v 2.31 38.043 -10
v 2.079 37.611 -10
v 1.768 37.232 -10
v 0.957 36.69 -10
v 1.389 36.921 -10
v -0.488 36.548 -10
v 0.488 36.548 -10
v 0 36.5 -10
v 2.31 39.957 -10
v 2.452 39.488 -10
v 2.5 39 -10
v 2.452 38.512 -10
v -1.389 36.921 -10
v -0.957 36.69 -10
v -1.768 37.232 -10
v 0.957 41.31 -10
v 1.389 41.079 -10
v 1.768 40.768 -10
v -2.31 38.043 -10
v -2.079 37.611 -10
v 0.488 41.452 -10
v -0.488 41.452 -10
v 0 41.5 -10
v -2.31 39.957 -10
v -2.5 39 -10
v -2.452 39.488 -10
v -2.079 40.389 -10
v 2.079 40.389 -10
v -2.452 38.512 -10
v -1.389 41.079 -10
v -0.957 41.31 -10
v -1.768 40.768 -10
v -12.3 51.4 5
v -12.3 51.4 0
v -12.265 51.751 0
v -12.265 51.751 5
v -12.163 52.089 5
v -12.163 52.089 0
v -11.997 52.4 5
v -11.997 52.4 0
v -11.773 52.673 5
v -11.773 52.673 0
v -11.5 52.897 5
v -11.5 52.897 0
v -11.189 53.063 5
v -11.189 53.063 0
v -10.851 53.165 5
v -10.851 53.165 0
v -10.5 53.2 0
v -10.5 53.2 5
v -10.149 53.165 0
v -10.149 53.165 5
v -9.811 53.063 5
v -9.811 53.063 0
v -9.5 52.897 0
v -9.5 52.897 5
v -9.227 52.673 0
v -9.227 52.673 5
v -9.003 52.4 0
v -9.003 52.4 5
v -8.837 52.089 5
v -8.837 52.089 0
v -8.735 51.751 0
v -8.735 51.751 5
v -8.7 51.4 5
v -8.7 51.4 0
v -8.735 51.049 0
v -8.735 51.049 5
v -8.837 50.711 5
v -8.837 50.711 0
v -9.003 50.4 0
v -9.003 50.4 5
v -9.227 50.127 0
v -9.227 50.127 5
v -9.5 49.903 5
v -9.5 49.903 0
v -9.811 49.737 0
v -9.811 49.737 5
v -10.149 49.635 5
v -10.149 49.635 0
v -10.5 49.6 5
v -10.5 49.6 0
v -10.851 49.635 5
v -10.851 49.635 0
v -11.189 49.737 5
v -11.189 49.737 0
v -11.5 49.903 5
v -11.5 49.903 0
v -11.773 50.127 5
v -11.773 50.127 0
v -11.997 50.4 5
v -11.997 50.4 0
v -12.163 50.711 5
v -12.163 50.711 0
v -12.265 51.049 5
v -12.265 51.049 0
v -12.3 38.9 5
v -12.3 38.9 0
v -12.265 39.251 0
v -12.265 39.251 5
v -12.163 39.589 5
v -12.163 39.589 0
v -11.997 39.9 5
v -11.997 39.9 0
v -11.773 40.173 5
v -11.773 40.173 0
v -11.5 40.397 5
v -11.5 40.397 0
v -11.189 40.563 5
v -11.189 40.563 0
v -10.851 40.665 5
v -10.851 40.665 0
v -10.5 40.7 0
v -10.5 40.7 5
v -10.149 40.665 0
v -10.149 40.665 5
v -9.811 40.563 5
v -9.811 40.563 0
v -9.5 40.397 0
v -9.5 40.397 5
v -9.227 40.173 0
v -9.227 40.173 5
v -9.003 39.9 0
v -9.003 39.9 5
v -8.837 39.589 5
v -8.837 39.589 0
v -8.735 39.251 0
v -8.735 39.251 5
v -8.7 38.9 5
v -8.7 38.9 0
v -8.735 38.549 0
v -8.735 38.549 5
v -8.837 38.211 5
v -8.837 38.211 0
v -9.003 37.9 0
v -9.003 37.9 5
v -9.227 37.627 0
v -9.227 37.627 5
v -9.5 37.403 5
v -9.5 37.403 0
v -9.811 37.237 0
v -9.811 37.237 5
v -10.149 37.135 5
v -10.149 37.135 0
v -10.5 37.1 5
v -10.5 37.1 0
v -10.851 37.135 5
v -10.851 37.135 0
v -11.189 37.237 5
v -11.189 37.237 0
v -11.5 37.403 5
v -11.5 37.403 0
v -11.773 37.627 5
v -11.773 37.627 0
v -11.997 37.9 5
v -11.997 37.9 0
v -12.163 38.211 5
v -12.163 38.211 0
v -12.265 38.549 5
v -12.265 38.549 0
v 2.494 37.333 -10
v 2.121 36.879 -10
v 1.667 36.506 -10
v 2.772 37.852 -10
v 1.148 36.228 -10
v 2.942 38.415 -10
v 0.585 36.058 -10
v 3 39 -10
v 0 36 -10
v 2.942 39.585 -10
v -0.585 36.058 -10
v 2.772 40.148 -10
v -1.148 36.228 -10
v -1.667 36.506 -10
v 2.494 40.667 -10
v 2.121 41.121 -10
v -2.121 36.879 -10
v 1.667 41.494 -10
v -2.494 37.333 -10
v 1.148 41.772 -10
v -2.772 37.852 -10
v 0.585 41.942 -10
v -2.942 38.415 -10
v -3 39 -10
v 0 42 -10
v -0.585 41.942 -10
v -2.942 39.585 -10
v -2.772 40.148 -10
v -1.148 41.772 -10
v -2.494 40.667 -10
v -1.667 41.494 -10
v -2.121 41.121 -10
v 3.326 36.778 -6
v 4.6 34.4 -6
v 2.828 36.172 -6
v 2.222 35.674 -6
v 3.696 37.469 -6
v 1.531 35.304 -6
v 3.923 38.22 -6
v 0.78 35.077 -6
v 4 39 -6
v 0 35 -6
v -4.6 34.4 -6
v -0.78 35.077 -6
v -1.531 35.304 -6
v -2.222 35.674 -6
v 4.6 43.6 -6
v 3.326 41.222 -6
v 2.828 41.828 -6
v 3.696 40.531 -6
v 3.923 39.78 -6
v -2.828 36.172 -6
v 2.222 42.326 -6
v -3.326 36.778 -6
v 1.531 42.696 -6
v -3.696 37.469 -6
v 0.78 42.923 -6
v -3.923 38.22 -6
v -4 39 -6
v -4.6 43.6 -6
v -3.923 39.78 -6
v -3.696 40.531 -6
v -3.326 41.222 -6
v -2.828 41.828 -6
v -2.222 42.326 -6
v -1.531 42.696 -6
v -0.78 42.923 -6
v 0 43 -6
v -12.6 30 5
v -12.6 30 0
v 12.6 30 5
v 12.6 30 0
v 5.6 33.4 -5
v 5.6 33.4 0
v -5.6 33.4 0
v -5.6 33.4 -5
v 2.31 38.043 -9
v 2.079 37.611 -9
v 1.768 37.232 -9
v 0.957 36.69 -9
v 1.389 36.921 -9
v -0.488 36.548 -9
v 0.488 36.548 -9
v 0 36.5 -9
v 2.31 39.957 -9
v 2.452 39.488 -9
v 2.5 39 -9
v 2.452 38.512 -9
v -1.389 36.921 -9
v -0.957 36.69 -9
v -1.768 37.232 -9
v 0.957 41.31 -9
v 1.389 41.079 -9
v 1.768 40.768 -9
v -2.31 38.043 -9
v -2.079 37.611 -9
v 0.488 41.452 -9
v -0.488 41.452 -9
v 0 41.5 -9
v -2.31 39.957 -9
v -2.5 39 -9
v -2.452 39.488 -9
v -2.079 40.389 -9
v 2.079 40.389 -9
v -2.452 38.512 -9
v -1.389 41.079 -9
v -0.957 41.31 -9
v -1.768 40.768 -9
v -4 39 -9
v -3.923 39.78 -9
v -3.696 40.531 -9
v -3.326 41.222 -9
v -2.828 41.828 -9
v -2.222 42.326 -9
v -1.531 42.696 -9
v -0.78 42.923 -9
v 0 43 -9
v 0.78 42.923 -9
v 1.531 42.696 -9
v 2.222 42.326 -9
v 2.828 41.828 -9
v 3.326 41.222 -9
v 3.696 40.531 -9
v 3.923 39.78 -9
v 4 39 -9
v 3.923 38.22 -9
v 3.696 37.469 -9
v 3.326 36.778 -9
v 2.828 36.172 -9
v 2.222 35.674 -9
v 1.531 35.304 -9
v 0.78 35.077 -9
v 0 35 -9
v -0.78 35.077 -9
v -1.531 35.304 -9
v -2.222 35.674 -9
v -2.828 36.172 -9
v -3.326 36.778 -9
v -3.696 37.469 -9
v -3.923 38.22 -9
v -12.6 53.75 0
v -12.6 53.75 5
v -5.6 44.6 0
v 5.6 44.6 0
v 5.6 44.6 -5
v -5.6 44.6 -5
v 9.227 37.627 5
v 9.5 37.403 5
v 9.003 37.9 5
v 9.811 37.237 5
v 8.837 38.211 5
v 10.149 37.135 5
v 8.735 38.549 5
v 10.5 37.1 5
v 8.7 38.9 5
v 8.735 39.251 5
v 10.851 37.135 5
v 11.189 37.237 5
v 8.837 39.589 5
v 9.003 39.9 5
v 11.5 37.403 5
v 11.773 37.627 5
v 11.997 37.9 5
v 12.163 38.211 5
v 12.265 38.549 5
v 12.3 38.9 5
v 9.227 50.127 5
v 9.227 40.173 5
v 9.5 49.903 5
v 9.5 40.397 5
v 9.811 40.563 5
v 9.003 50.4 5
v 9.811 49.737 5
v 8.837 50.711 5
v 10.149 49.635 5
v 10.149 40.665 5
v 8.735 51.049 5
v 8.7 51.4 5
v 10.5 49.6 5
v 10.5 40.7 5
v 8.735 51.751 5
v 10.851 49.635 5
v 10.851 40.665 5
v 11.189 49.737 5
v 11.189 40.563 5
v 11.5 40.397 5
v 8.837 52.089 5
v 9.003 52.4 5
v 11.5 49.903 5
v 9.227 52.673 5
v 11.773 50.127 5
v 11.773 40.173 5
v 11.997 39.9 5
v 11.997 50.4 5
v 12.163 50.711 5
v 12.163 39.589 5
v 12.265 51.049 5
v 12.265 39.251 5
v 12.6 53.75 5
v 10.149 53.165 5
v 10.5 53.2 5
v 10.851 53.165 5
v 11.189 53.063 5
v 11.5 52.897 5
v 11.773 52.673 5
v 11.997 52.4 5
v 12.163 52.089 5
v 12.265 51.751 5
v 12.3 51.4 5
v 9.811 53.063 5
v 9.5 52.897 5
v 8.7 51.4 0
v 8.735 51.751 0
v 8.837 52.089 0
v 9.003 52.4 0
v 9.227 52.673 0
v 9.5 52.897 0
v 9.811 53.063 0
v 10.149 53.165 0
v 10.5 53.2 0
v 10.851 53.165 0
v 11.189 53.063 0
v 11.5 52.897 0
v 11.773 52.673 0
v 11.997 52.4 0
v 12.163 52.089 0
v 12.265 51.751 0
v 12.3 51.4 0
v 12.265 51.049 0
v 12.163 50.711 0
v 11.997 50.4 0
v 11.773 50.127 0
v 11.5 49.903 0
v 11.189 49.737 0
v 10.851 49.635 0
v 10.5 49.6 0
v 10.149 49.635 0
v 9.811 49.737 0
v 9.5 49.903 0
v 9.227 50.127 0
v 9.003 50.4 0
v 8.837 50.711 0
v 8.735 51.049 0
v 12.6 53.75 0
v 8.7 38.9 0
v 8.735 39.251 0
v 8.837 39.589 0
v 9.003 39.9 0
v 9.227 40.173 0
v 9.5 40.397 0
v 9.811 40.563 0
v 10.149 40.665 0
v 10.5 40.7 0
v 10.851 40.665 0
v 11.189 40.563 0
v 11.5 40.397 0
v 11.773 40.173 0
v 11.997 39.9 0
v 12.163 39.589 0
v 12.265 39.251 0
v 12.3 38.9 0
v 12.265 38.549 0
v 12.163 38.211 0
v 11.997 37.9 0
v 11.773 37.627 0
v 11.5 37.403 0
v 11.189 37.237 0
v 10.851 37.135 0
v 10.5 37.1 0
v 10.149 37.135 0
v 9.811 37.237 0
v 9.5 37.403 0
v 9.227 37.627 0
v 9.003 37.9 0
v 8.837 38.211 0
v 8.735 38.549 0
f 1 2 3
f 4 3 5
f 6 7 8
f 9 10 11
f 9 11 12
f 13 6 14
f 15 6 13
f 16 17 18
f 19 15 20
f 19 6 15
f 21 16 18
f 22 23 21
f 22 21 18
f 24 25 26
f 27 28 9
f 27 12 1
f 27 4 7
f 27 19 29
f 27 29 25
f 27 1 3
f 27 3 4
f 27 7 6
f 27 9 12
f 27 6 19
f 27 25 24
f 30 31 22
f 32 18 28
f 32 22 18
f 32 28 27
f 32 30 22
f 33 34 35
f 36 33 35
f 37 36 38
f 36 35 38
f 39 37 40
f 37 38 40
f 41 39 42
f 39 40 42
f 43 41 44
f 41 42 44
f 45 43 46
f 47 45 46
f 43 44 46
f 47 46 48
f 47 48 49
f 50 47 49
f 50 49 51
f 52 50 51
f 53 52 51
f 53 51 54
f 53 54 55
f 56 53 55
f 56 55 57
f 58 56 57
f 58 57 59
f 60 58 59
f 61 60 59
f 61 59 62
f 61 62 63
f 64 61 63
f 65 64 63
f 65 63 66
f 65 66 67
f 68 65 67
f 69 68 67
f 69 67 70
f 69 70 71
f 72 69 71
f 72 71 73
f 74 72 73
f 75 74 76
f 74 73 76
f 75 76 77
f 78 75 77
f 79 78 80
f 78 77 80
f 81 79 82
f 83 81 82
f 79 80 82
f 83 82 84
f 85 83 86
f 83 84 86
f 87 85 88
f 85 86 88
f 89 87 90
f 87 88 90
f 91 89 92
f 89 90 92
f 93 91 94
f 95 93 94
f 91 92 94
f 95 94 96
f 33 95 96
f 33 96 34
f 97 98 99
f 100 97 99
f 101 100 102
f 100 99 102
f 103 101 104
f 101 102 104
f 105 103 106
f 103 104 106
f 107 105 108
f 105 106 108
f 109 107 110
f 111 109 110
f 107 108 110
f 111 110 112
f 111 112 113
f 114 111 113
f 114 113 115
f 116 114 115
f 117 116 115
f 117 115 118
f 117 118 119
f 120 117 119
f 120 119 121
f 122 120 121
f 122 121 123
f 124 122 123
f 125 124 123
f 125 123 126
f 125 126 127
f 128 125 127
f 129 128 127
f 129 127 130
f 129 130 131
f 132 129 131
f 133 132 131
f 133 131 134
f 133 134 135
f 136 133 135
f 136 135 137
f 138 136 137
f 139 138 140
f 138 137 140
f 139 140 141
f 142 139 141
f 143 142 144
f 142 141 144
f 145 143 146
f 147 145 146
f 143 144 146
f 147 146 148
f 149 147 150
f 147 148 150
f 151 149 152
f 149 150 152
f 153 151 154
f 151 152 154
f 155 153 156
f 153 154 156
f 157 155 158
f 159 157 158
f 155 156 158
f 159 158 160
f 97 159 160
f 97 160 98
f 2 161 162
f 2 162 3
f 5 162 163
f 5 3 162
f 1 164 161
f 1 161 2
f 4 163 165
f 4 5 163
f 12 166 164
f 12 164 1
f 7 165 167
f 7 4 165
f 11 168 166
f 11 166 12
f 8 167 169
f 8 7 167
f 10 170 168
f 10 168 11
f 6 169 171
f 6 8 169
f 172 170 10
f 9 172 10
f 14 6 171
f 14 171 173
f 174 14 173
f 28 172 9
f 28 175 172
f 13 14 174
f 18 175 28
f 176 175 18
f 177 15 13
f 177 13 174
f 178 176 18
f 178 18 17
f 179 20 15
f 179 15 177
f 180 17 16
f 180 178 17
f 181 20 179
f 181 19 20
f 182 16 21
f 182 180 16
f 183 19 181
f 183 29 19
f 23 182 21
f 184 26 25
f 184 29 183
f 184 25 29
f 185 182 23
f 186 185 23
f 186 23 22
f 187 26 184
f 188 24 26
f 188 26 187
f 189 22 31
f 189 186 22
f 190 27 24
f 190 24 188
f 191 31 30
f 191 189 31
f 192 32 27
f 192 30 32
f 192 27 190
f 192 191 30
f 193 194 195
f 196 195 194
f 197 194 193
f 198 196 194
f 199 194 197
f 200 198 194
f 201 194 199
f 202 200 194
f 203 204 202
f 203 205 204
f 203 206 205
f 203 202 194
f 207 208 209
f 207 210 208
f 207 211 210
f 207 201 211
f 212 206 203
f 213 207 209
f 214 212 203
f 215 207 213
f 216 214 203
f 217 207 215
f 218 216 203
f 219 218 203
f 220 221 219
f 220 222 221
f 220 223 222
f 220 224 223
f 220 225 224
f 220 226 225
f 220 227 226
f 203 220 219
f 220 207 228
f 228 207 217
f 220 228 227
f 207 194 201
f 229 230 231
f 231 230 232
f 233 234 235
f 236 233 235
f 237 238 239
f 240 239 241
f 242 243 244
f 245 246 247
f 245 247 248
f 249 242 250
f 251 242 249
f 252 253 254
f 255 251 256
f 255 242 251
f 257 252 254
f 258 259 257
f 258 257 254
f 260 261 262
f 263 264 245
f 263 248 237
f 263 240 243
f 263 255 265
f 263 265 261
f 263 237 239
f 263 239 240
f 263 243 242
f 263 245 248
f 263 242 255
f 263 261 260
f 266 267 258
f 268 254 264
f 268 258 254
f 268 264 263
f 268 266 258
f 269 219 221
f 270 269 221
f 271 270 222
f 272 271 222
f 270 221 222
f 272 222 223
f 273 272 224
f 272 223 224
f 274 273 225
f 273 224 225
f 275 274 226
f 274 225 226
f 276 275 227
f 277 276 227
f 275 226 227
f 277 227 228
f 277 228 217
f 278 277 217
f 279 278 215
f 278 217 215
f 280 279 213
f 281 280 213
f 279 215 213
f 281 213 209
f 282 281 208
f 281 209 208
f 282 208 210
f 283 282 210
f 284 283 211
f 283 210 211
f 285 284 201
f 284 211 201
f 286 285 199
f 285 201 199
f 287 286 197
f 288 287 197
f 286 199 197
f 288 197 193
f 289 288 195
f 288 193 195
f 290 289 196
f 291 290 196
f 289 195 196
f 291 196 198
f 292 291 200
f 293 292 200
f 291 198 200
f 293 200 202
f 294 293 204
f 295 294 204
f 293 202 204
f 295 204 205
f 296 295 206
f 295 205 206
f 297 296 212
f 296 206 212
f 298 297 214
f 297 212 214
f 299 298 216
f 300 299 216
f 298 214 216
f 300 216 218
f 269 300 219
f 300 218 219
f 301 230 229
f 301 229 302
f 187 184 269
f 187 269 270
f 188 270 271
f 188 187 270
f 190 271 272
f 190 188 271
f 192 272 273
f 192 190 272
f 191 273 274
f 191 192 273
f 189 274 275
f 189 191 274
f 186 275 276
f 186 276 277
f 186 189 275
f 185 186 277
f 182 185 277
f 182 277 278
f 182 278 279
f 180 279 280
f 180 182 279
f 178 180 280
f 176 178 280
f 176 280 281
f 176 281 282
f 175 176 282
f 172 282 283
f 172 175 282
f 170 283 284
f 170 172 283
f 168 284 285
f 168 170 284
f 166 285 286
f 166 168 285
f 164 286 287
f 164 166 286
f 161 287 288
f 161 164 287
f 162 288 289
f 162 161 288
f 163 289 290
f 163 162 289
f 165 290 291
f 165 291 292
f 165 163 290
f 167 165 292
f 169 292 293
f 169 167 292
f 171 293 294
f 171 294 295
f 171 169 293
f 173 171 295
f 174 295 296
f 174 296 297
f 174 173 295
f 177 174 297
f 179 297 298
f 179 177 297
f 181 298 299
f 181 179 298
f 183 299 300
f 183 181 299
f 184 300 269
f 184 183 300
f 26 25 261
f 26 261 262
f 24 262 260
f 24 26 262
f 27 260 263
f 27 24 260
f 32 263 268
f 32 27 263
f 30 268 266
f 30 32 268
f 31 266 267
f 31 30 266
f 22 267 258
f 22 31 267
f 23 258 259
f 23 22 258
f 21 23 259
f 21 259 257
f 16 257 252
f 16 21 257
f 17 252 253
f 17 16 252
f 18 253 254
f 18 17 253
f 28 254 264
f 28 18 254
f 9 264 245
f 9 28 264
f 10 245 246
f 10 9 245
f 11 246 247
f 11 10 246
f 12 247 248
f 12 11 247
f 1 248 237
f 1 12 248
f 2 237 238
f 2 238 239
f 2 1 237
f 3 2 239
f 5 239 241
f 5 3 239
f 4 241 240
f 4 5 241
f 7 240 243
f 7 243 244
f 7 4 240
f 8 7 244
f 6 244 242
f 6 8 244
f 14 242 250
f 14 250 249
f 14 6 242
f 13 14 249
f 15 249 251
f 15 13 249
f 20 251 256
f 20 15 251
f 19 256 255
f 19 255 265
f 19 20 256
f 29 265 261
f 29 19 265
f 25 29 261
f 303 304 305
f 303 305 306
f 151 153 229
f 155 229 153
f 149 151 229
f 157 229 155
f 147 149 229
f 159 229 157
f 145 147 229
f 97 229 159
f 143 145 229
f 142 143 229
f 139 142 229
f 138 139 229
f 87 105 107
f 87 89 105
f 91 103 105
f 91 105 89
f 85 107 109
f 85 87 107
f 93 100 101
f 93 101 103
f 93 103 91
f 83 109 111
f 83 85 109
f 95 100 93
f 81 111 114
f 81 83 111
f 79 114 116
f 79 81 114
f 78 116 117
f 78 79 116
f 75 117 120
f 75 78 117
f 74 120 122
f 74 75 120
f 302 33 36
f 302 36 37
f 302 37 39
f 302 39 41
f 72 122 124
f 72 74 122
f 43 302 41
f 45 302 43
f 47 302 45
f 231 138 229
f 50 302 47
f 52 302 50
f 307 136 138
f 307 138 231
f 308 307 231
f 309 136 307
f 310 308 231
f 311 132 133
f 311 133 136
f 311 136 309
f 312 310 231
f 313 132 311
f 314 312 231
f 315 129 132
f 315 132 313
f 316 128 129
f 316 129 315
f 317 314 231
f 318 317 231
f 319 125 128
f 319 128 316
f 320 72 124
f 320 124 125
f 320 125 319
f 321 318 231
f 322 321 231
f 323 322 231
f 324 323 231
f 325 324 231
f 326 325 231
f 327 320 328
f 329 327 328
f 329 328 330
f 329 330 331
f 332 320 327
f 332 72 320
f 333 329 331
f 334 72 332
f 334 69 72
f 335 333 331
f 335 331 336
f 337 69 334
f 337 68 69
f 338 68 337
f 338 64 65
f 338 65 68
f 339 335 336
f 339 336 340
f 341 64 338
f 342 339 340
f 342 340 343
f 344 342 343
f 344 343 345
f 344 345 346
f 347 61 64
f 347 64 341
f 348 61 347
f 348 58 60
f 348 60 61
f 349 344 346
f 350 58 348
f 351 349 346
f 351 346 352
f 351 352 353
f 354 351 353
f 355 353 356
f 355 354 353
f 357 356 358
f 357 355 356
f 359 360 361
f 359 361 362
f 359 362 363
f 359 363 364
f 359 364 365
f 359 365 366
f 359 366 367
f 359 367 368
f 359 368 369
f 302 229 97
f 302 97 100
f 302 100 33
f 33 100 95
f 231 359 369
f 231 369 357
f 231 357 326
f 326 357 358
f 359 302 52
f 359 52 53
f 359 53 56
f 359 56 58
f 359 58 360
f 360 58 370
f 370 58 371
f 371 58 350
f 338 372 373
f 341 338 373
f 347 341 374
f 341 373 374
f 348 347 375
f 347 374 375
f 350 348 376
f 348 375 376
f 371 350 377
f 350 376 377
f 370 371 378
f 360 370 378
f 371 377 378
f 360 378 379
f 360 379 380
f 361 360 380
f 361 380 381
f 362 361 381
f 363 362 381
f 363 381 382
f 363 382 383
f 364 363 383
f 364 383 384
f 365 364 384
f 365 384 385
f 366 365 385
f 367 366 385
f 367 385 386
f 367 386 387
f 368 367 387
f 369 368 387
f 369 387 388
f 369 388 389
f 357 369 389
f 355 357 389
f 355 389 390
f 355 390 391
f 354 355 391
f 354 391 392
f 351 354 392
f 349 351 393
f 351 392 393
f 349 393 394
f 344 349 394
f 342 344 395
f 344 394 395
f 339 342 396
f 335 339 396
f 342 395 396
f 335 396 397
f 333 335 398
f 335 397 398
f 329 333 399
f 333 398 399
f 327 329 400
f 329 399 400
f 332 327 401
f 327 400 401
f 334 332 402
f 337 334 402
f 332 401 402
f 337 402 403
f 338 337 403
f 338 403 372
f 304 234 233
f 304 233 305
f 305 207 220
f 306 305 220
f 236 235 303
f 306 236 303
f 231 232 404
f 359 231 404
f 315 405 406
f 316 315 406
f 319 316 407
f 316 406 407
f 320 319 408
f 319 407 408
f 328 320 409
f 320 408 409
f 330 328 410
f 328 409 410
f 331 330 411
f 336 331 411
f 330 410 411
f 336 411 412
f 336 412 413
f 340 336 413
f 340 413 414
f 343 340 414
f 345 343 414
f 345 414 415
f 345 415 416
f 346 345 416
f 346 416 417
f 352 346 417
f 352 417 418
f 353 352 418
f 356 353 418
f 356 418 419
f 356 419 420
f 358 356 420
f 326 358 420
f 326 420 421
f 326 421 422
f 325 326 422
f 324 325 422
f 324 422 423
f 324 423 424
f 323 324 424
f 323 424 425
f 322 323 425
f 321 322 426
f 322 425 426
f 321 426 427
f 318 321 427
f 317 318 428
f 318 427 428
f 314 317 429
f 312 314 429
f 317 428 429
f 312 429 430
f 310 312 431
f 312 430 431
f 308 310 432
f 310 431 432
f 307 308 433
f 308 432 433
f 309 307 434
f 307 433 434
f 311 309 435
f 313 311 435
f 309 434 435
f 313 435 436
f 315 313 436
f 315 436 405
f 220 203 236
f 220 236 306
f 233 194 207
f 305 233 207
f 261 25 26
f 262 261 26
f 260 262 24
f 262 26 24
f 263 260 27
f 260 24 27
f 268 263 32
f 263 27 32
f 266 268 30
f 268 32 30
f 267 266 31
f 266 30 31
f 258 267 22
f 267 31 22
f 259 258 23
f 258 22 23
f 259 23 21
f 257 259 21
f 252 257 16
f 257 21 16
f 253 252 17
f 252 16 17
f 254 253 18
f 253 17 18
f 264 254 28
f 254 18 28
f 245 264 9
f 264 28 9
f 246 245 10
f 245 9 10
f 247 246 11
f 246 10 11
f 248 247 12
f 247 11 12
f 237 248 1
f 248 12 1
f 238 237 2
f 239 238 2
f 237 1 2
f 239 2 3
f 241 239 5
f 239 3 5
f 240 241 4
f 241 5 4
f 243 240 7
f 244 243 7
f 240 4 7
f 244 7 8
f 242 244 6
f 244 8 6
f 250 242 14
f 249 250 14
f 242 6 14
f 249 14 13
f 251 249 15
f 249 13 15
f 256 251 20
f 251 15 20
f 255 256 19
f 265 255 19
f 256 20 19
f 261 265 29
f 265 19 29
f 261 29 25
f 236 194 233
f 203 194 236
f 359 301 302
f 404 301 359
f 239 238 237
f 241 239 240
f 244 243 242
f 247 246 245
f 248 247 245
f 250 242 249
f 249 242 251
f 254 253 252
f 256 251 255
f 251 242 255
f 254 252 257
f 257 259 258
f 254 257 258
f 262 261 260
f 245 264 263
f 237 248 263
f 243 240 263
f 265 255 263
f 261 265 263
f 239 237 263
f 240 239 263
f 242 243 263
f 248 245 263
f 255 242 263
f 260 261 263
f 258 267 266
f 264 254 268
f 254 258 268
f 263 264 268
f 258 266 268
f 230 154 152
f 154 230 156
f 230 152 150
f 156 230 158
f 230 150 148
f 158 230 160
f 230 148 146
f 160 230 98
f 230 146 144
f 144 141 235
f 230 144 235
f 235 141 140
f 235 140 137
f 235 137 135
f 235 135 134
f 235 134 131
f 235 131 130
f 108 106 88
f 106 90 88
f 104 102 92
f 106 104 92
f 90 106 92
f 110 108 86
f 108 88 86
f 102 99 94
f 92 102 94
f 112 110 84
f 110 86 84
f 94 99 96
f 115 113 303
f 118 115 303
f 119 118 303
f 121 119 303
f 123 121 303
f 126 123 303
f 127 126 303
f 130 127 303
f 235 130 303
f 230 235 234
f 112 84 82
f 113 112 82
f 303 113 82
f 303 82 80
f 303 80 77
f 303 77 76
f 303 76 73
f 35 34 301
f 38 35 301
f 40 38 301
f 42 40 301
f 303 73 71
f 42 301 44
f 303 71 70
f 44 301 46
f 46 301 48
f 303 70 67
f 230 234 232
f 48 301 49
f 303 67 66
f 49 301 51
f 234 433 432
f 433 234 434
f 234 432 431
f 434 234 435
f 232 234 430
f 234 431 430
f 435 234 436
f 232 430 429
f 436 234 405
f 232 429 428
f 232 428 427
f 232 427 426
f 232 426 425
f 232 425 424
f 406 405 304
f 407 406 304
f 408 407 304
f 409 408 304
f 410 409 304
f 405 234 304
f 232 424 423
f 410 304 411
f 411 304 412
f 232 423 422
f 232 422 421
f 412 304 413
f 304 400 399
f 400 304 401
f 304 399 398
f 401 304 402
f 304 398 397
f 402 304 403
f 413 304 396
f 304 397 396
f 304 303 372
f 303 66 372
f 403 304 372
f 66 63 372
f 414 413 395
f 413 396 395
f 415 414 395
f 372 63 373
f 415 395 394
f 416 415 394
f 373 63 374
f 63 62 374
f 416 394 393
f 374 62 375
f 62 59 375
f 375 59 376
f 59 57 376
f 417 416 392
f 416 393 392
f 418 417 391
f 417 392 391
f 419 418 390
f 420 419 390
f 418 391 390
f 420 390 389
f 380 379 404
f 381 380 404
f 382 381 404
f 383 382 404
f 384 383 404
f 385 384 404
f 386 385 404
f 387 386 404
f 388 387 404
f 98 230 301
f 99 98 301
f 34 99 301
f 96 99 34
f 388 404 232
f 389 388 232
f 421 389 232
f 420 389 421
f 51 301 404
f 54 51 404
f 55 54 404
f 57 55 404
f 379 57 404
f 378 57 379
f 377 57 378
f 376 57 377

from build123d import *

# Parameters (mm, degrees)
SKETCH2_W           = 25.2
SKETCH2_H           = 23.75
BOSS_EXTRUDE1_DEPTH = 5
SKETCH3_R           = 1.8
CUT_EXTRUDE1_DEPTH  = 6
SKETCH4_W           = 11.2
SKETCH4_H           = 11.2
BOSS_EXTRUDE2_DEPTH = 6
SKETCH5_R           = 4
BOSS_EXTRUDE3_DEPTH = 4
SKETCH6_R           = 2.5
CUT_EXTRUDE2_DEPTH  = 1
SKETCH6_2_R         = 2.5
BOSS_EXTRUDE4_DEPTH = 1
CHAMFER1_SIZE       = 1


with BuildPart() as part:
    # Sketch2 → Boss-Extrude1 (new body)
    with BuildSketch(Plane.XY):
        with Locations((0, 41.875)):
            Rectangle(SKETCH2_W, SKETCH2_H)
    extrude(amount=BOSS_EXTRUDE1_DEPTH)

    # Sketch3 → Cut-Extrude1 (cut, through all)
    with BuildSketch(Plane(origin=(0, 0, 0), x_dir=(-1, 0, 0), z_dir=(0, 0, -1))):
        with Locations((-10.5, 51.4)):
            Circle(SKETCH3_R)
        with Locations((10.5, 51.4)):
            Circle(SKETCH3_R)
        with Locations((10.5, 38.9)):
            Circle(SKETCH3_R)
        with Locations((-10.5, 38.9)):
            Circle(SKETCH3_R)
    extrude(amount=-CUT_EXTRUDE1_DEPTH, mode=Mode.SUBTRACT)

    # Sketch4 → Boss-Extrude2 (add)
    with BuildSketch(Plane(origin=(0, 0, 0), x_dir=(-1, 0, 0), z_dir=(0, 0, -1))):
        with Locations((0, 39)):
            Rectangle(SKETCH4_W, SKETCH4_H)
    extrude(amount=BOSS_EXTRUDE2_DEPTH)

    # Sketch5 → Boss-Extrude3 (add)
    with BuildSketch(Plane(origin=(0, 0, -6), x_dir=(-1, 0, 0), z_dir=(0, 0, -1))):
        with Locations((0, 39)):
            Circle(SKETCH5_R)
    extrude(amount=BOSS_EXTRUDE3_DEPTH)

    # Sketch6 → Cut-Extrude2 (cut)
    with BuildSketch(Plane(origin=(0, 0, -10), x_dir=(-1, 0, 0), z_dir=(0, 0, -1))):
        with Locations((0, 39)):
            Circle(SKETCH6_R)
    extrude(amount=-CUT_EXTRUDE2_DEPTH, mode=Mode.SUBTRACT)

    # Chamfer1
    chamfer1_edges = [part.edges().sort_by_distance(p)[0] for p in [
        (-5.6, 39, -6),
        (0, 44.6, -6),
        (5.6, 39, -6),
        (0, 33.4, -6),
        (4, 39, -10),
    ]]
    chamfer(chamfer1_edges, length=CHAMFER1_SIZE)


with BuildPart() as body_2:
    # Sketch6<2> → Boss-Extrude4 (new body)
    with BuildSketch(Plane(origin=(0, 0, -10), x_dir=(-1, 0, 0), z_dir=(0, 0, -1))):
        with Locations((0, 39)):
            Circle(SKETCH6_2_R)
    extrude(amount=-BOSS_EXTRUDE4_DEPTH)


solid = Compound([part.part, body_2.part])
